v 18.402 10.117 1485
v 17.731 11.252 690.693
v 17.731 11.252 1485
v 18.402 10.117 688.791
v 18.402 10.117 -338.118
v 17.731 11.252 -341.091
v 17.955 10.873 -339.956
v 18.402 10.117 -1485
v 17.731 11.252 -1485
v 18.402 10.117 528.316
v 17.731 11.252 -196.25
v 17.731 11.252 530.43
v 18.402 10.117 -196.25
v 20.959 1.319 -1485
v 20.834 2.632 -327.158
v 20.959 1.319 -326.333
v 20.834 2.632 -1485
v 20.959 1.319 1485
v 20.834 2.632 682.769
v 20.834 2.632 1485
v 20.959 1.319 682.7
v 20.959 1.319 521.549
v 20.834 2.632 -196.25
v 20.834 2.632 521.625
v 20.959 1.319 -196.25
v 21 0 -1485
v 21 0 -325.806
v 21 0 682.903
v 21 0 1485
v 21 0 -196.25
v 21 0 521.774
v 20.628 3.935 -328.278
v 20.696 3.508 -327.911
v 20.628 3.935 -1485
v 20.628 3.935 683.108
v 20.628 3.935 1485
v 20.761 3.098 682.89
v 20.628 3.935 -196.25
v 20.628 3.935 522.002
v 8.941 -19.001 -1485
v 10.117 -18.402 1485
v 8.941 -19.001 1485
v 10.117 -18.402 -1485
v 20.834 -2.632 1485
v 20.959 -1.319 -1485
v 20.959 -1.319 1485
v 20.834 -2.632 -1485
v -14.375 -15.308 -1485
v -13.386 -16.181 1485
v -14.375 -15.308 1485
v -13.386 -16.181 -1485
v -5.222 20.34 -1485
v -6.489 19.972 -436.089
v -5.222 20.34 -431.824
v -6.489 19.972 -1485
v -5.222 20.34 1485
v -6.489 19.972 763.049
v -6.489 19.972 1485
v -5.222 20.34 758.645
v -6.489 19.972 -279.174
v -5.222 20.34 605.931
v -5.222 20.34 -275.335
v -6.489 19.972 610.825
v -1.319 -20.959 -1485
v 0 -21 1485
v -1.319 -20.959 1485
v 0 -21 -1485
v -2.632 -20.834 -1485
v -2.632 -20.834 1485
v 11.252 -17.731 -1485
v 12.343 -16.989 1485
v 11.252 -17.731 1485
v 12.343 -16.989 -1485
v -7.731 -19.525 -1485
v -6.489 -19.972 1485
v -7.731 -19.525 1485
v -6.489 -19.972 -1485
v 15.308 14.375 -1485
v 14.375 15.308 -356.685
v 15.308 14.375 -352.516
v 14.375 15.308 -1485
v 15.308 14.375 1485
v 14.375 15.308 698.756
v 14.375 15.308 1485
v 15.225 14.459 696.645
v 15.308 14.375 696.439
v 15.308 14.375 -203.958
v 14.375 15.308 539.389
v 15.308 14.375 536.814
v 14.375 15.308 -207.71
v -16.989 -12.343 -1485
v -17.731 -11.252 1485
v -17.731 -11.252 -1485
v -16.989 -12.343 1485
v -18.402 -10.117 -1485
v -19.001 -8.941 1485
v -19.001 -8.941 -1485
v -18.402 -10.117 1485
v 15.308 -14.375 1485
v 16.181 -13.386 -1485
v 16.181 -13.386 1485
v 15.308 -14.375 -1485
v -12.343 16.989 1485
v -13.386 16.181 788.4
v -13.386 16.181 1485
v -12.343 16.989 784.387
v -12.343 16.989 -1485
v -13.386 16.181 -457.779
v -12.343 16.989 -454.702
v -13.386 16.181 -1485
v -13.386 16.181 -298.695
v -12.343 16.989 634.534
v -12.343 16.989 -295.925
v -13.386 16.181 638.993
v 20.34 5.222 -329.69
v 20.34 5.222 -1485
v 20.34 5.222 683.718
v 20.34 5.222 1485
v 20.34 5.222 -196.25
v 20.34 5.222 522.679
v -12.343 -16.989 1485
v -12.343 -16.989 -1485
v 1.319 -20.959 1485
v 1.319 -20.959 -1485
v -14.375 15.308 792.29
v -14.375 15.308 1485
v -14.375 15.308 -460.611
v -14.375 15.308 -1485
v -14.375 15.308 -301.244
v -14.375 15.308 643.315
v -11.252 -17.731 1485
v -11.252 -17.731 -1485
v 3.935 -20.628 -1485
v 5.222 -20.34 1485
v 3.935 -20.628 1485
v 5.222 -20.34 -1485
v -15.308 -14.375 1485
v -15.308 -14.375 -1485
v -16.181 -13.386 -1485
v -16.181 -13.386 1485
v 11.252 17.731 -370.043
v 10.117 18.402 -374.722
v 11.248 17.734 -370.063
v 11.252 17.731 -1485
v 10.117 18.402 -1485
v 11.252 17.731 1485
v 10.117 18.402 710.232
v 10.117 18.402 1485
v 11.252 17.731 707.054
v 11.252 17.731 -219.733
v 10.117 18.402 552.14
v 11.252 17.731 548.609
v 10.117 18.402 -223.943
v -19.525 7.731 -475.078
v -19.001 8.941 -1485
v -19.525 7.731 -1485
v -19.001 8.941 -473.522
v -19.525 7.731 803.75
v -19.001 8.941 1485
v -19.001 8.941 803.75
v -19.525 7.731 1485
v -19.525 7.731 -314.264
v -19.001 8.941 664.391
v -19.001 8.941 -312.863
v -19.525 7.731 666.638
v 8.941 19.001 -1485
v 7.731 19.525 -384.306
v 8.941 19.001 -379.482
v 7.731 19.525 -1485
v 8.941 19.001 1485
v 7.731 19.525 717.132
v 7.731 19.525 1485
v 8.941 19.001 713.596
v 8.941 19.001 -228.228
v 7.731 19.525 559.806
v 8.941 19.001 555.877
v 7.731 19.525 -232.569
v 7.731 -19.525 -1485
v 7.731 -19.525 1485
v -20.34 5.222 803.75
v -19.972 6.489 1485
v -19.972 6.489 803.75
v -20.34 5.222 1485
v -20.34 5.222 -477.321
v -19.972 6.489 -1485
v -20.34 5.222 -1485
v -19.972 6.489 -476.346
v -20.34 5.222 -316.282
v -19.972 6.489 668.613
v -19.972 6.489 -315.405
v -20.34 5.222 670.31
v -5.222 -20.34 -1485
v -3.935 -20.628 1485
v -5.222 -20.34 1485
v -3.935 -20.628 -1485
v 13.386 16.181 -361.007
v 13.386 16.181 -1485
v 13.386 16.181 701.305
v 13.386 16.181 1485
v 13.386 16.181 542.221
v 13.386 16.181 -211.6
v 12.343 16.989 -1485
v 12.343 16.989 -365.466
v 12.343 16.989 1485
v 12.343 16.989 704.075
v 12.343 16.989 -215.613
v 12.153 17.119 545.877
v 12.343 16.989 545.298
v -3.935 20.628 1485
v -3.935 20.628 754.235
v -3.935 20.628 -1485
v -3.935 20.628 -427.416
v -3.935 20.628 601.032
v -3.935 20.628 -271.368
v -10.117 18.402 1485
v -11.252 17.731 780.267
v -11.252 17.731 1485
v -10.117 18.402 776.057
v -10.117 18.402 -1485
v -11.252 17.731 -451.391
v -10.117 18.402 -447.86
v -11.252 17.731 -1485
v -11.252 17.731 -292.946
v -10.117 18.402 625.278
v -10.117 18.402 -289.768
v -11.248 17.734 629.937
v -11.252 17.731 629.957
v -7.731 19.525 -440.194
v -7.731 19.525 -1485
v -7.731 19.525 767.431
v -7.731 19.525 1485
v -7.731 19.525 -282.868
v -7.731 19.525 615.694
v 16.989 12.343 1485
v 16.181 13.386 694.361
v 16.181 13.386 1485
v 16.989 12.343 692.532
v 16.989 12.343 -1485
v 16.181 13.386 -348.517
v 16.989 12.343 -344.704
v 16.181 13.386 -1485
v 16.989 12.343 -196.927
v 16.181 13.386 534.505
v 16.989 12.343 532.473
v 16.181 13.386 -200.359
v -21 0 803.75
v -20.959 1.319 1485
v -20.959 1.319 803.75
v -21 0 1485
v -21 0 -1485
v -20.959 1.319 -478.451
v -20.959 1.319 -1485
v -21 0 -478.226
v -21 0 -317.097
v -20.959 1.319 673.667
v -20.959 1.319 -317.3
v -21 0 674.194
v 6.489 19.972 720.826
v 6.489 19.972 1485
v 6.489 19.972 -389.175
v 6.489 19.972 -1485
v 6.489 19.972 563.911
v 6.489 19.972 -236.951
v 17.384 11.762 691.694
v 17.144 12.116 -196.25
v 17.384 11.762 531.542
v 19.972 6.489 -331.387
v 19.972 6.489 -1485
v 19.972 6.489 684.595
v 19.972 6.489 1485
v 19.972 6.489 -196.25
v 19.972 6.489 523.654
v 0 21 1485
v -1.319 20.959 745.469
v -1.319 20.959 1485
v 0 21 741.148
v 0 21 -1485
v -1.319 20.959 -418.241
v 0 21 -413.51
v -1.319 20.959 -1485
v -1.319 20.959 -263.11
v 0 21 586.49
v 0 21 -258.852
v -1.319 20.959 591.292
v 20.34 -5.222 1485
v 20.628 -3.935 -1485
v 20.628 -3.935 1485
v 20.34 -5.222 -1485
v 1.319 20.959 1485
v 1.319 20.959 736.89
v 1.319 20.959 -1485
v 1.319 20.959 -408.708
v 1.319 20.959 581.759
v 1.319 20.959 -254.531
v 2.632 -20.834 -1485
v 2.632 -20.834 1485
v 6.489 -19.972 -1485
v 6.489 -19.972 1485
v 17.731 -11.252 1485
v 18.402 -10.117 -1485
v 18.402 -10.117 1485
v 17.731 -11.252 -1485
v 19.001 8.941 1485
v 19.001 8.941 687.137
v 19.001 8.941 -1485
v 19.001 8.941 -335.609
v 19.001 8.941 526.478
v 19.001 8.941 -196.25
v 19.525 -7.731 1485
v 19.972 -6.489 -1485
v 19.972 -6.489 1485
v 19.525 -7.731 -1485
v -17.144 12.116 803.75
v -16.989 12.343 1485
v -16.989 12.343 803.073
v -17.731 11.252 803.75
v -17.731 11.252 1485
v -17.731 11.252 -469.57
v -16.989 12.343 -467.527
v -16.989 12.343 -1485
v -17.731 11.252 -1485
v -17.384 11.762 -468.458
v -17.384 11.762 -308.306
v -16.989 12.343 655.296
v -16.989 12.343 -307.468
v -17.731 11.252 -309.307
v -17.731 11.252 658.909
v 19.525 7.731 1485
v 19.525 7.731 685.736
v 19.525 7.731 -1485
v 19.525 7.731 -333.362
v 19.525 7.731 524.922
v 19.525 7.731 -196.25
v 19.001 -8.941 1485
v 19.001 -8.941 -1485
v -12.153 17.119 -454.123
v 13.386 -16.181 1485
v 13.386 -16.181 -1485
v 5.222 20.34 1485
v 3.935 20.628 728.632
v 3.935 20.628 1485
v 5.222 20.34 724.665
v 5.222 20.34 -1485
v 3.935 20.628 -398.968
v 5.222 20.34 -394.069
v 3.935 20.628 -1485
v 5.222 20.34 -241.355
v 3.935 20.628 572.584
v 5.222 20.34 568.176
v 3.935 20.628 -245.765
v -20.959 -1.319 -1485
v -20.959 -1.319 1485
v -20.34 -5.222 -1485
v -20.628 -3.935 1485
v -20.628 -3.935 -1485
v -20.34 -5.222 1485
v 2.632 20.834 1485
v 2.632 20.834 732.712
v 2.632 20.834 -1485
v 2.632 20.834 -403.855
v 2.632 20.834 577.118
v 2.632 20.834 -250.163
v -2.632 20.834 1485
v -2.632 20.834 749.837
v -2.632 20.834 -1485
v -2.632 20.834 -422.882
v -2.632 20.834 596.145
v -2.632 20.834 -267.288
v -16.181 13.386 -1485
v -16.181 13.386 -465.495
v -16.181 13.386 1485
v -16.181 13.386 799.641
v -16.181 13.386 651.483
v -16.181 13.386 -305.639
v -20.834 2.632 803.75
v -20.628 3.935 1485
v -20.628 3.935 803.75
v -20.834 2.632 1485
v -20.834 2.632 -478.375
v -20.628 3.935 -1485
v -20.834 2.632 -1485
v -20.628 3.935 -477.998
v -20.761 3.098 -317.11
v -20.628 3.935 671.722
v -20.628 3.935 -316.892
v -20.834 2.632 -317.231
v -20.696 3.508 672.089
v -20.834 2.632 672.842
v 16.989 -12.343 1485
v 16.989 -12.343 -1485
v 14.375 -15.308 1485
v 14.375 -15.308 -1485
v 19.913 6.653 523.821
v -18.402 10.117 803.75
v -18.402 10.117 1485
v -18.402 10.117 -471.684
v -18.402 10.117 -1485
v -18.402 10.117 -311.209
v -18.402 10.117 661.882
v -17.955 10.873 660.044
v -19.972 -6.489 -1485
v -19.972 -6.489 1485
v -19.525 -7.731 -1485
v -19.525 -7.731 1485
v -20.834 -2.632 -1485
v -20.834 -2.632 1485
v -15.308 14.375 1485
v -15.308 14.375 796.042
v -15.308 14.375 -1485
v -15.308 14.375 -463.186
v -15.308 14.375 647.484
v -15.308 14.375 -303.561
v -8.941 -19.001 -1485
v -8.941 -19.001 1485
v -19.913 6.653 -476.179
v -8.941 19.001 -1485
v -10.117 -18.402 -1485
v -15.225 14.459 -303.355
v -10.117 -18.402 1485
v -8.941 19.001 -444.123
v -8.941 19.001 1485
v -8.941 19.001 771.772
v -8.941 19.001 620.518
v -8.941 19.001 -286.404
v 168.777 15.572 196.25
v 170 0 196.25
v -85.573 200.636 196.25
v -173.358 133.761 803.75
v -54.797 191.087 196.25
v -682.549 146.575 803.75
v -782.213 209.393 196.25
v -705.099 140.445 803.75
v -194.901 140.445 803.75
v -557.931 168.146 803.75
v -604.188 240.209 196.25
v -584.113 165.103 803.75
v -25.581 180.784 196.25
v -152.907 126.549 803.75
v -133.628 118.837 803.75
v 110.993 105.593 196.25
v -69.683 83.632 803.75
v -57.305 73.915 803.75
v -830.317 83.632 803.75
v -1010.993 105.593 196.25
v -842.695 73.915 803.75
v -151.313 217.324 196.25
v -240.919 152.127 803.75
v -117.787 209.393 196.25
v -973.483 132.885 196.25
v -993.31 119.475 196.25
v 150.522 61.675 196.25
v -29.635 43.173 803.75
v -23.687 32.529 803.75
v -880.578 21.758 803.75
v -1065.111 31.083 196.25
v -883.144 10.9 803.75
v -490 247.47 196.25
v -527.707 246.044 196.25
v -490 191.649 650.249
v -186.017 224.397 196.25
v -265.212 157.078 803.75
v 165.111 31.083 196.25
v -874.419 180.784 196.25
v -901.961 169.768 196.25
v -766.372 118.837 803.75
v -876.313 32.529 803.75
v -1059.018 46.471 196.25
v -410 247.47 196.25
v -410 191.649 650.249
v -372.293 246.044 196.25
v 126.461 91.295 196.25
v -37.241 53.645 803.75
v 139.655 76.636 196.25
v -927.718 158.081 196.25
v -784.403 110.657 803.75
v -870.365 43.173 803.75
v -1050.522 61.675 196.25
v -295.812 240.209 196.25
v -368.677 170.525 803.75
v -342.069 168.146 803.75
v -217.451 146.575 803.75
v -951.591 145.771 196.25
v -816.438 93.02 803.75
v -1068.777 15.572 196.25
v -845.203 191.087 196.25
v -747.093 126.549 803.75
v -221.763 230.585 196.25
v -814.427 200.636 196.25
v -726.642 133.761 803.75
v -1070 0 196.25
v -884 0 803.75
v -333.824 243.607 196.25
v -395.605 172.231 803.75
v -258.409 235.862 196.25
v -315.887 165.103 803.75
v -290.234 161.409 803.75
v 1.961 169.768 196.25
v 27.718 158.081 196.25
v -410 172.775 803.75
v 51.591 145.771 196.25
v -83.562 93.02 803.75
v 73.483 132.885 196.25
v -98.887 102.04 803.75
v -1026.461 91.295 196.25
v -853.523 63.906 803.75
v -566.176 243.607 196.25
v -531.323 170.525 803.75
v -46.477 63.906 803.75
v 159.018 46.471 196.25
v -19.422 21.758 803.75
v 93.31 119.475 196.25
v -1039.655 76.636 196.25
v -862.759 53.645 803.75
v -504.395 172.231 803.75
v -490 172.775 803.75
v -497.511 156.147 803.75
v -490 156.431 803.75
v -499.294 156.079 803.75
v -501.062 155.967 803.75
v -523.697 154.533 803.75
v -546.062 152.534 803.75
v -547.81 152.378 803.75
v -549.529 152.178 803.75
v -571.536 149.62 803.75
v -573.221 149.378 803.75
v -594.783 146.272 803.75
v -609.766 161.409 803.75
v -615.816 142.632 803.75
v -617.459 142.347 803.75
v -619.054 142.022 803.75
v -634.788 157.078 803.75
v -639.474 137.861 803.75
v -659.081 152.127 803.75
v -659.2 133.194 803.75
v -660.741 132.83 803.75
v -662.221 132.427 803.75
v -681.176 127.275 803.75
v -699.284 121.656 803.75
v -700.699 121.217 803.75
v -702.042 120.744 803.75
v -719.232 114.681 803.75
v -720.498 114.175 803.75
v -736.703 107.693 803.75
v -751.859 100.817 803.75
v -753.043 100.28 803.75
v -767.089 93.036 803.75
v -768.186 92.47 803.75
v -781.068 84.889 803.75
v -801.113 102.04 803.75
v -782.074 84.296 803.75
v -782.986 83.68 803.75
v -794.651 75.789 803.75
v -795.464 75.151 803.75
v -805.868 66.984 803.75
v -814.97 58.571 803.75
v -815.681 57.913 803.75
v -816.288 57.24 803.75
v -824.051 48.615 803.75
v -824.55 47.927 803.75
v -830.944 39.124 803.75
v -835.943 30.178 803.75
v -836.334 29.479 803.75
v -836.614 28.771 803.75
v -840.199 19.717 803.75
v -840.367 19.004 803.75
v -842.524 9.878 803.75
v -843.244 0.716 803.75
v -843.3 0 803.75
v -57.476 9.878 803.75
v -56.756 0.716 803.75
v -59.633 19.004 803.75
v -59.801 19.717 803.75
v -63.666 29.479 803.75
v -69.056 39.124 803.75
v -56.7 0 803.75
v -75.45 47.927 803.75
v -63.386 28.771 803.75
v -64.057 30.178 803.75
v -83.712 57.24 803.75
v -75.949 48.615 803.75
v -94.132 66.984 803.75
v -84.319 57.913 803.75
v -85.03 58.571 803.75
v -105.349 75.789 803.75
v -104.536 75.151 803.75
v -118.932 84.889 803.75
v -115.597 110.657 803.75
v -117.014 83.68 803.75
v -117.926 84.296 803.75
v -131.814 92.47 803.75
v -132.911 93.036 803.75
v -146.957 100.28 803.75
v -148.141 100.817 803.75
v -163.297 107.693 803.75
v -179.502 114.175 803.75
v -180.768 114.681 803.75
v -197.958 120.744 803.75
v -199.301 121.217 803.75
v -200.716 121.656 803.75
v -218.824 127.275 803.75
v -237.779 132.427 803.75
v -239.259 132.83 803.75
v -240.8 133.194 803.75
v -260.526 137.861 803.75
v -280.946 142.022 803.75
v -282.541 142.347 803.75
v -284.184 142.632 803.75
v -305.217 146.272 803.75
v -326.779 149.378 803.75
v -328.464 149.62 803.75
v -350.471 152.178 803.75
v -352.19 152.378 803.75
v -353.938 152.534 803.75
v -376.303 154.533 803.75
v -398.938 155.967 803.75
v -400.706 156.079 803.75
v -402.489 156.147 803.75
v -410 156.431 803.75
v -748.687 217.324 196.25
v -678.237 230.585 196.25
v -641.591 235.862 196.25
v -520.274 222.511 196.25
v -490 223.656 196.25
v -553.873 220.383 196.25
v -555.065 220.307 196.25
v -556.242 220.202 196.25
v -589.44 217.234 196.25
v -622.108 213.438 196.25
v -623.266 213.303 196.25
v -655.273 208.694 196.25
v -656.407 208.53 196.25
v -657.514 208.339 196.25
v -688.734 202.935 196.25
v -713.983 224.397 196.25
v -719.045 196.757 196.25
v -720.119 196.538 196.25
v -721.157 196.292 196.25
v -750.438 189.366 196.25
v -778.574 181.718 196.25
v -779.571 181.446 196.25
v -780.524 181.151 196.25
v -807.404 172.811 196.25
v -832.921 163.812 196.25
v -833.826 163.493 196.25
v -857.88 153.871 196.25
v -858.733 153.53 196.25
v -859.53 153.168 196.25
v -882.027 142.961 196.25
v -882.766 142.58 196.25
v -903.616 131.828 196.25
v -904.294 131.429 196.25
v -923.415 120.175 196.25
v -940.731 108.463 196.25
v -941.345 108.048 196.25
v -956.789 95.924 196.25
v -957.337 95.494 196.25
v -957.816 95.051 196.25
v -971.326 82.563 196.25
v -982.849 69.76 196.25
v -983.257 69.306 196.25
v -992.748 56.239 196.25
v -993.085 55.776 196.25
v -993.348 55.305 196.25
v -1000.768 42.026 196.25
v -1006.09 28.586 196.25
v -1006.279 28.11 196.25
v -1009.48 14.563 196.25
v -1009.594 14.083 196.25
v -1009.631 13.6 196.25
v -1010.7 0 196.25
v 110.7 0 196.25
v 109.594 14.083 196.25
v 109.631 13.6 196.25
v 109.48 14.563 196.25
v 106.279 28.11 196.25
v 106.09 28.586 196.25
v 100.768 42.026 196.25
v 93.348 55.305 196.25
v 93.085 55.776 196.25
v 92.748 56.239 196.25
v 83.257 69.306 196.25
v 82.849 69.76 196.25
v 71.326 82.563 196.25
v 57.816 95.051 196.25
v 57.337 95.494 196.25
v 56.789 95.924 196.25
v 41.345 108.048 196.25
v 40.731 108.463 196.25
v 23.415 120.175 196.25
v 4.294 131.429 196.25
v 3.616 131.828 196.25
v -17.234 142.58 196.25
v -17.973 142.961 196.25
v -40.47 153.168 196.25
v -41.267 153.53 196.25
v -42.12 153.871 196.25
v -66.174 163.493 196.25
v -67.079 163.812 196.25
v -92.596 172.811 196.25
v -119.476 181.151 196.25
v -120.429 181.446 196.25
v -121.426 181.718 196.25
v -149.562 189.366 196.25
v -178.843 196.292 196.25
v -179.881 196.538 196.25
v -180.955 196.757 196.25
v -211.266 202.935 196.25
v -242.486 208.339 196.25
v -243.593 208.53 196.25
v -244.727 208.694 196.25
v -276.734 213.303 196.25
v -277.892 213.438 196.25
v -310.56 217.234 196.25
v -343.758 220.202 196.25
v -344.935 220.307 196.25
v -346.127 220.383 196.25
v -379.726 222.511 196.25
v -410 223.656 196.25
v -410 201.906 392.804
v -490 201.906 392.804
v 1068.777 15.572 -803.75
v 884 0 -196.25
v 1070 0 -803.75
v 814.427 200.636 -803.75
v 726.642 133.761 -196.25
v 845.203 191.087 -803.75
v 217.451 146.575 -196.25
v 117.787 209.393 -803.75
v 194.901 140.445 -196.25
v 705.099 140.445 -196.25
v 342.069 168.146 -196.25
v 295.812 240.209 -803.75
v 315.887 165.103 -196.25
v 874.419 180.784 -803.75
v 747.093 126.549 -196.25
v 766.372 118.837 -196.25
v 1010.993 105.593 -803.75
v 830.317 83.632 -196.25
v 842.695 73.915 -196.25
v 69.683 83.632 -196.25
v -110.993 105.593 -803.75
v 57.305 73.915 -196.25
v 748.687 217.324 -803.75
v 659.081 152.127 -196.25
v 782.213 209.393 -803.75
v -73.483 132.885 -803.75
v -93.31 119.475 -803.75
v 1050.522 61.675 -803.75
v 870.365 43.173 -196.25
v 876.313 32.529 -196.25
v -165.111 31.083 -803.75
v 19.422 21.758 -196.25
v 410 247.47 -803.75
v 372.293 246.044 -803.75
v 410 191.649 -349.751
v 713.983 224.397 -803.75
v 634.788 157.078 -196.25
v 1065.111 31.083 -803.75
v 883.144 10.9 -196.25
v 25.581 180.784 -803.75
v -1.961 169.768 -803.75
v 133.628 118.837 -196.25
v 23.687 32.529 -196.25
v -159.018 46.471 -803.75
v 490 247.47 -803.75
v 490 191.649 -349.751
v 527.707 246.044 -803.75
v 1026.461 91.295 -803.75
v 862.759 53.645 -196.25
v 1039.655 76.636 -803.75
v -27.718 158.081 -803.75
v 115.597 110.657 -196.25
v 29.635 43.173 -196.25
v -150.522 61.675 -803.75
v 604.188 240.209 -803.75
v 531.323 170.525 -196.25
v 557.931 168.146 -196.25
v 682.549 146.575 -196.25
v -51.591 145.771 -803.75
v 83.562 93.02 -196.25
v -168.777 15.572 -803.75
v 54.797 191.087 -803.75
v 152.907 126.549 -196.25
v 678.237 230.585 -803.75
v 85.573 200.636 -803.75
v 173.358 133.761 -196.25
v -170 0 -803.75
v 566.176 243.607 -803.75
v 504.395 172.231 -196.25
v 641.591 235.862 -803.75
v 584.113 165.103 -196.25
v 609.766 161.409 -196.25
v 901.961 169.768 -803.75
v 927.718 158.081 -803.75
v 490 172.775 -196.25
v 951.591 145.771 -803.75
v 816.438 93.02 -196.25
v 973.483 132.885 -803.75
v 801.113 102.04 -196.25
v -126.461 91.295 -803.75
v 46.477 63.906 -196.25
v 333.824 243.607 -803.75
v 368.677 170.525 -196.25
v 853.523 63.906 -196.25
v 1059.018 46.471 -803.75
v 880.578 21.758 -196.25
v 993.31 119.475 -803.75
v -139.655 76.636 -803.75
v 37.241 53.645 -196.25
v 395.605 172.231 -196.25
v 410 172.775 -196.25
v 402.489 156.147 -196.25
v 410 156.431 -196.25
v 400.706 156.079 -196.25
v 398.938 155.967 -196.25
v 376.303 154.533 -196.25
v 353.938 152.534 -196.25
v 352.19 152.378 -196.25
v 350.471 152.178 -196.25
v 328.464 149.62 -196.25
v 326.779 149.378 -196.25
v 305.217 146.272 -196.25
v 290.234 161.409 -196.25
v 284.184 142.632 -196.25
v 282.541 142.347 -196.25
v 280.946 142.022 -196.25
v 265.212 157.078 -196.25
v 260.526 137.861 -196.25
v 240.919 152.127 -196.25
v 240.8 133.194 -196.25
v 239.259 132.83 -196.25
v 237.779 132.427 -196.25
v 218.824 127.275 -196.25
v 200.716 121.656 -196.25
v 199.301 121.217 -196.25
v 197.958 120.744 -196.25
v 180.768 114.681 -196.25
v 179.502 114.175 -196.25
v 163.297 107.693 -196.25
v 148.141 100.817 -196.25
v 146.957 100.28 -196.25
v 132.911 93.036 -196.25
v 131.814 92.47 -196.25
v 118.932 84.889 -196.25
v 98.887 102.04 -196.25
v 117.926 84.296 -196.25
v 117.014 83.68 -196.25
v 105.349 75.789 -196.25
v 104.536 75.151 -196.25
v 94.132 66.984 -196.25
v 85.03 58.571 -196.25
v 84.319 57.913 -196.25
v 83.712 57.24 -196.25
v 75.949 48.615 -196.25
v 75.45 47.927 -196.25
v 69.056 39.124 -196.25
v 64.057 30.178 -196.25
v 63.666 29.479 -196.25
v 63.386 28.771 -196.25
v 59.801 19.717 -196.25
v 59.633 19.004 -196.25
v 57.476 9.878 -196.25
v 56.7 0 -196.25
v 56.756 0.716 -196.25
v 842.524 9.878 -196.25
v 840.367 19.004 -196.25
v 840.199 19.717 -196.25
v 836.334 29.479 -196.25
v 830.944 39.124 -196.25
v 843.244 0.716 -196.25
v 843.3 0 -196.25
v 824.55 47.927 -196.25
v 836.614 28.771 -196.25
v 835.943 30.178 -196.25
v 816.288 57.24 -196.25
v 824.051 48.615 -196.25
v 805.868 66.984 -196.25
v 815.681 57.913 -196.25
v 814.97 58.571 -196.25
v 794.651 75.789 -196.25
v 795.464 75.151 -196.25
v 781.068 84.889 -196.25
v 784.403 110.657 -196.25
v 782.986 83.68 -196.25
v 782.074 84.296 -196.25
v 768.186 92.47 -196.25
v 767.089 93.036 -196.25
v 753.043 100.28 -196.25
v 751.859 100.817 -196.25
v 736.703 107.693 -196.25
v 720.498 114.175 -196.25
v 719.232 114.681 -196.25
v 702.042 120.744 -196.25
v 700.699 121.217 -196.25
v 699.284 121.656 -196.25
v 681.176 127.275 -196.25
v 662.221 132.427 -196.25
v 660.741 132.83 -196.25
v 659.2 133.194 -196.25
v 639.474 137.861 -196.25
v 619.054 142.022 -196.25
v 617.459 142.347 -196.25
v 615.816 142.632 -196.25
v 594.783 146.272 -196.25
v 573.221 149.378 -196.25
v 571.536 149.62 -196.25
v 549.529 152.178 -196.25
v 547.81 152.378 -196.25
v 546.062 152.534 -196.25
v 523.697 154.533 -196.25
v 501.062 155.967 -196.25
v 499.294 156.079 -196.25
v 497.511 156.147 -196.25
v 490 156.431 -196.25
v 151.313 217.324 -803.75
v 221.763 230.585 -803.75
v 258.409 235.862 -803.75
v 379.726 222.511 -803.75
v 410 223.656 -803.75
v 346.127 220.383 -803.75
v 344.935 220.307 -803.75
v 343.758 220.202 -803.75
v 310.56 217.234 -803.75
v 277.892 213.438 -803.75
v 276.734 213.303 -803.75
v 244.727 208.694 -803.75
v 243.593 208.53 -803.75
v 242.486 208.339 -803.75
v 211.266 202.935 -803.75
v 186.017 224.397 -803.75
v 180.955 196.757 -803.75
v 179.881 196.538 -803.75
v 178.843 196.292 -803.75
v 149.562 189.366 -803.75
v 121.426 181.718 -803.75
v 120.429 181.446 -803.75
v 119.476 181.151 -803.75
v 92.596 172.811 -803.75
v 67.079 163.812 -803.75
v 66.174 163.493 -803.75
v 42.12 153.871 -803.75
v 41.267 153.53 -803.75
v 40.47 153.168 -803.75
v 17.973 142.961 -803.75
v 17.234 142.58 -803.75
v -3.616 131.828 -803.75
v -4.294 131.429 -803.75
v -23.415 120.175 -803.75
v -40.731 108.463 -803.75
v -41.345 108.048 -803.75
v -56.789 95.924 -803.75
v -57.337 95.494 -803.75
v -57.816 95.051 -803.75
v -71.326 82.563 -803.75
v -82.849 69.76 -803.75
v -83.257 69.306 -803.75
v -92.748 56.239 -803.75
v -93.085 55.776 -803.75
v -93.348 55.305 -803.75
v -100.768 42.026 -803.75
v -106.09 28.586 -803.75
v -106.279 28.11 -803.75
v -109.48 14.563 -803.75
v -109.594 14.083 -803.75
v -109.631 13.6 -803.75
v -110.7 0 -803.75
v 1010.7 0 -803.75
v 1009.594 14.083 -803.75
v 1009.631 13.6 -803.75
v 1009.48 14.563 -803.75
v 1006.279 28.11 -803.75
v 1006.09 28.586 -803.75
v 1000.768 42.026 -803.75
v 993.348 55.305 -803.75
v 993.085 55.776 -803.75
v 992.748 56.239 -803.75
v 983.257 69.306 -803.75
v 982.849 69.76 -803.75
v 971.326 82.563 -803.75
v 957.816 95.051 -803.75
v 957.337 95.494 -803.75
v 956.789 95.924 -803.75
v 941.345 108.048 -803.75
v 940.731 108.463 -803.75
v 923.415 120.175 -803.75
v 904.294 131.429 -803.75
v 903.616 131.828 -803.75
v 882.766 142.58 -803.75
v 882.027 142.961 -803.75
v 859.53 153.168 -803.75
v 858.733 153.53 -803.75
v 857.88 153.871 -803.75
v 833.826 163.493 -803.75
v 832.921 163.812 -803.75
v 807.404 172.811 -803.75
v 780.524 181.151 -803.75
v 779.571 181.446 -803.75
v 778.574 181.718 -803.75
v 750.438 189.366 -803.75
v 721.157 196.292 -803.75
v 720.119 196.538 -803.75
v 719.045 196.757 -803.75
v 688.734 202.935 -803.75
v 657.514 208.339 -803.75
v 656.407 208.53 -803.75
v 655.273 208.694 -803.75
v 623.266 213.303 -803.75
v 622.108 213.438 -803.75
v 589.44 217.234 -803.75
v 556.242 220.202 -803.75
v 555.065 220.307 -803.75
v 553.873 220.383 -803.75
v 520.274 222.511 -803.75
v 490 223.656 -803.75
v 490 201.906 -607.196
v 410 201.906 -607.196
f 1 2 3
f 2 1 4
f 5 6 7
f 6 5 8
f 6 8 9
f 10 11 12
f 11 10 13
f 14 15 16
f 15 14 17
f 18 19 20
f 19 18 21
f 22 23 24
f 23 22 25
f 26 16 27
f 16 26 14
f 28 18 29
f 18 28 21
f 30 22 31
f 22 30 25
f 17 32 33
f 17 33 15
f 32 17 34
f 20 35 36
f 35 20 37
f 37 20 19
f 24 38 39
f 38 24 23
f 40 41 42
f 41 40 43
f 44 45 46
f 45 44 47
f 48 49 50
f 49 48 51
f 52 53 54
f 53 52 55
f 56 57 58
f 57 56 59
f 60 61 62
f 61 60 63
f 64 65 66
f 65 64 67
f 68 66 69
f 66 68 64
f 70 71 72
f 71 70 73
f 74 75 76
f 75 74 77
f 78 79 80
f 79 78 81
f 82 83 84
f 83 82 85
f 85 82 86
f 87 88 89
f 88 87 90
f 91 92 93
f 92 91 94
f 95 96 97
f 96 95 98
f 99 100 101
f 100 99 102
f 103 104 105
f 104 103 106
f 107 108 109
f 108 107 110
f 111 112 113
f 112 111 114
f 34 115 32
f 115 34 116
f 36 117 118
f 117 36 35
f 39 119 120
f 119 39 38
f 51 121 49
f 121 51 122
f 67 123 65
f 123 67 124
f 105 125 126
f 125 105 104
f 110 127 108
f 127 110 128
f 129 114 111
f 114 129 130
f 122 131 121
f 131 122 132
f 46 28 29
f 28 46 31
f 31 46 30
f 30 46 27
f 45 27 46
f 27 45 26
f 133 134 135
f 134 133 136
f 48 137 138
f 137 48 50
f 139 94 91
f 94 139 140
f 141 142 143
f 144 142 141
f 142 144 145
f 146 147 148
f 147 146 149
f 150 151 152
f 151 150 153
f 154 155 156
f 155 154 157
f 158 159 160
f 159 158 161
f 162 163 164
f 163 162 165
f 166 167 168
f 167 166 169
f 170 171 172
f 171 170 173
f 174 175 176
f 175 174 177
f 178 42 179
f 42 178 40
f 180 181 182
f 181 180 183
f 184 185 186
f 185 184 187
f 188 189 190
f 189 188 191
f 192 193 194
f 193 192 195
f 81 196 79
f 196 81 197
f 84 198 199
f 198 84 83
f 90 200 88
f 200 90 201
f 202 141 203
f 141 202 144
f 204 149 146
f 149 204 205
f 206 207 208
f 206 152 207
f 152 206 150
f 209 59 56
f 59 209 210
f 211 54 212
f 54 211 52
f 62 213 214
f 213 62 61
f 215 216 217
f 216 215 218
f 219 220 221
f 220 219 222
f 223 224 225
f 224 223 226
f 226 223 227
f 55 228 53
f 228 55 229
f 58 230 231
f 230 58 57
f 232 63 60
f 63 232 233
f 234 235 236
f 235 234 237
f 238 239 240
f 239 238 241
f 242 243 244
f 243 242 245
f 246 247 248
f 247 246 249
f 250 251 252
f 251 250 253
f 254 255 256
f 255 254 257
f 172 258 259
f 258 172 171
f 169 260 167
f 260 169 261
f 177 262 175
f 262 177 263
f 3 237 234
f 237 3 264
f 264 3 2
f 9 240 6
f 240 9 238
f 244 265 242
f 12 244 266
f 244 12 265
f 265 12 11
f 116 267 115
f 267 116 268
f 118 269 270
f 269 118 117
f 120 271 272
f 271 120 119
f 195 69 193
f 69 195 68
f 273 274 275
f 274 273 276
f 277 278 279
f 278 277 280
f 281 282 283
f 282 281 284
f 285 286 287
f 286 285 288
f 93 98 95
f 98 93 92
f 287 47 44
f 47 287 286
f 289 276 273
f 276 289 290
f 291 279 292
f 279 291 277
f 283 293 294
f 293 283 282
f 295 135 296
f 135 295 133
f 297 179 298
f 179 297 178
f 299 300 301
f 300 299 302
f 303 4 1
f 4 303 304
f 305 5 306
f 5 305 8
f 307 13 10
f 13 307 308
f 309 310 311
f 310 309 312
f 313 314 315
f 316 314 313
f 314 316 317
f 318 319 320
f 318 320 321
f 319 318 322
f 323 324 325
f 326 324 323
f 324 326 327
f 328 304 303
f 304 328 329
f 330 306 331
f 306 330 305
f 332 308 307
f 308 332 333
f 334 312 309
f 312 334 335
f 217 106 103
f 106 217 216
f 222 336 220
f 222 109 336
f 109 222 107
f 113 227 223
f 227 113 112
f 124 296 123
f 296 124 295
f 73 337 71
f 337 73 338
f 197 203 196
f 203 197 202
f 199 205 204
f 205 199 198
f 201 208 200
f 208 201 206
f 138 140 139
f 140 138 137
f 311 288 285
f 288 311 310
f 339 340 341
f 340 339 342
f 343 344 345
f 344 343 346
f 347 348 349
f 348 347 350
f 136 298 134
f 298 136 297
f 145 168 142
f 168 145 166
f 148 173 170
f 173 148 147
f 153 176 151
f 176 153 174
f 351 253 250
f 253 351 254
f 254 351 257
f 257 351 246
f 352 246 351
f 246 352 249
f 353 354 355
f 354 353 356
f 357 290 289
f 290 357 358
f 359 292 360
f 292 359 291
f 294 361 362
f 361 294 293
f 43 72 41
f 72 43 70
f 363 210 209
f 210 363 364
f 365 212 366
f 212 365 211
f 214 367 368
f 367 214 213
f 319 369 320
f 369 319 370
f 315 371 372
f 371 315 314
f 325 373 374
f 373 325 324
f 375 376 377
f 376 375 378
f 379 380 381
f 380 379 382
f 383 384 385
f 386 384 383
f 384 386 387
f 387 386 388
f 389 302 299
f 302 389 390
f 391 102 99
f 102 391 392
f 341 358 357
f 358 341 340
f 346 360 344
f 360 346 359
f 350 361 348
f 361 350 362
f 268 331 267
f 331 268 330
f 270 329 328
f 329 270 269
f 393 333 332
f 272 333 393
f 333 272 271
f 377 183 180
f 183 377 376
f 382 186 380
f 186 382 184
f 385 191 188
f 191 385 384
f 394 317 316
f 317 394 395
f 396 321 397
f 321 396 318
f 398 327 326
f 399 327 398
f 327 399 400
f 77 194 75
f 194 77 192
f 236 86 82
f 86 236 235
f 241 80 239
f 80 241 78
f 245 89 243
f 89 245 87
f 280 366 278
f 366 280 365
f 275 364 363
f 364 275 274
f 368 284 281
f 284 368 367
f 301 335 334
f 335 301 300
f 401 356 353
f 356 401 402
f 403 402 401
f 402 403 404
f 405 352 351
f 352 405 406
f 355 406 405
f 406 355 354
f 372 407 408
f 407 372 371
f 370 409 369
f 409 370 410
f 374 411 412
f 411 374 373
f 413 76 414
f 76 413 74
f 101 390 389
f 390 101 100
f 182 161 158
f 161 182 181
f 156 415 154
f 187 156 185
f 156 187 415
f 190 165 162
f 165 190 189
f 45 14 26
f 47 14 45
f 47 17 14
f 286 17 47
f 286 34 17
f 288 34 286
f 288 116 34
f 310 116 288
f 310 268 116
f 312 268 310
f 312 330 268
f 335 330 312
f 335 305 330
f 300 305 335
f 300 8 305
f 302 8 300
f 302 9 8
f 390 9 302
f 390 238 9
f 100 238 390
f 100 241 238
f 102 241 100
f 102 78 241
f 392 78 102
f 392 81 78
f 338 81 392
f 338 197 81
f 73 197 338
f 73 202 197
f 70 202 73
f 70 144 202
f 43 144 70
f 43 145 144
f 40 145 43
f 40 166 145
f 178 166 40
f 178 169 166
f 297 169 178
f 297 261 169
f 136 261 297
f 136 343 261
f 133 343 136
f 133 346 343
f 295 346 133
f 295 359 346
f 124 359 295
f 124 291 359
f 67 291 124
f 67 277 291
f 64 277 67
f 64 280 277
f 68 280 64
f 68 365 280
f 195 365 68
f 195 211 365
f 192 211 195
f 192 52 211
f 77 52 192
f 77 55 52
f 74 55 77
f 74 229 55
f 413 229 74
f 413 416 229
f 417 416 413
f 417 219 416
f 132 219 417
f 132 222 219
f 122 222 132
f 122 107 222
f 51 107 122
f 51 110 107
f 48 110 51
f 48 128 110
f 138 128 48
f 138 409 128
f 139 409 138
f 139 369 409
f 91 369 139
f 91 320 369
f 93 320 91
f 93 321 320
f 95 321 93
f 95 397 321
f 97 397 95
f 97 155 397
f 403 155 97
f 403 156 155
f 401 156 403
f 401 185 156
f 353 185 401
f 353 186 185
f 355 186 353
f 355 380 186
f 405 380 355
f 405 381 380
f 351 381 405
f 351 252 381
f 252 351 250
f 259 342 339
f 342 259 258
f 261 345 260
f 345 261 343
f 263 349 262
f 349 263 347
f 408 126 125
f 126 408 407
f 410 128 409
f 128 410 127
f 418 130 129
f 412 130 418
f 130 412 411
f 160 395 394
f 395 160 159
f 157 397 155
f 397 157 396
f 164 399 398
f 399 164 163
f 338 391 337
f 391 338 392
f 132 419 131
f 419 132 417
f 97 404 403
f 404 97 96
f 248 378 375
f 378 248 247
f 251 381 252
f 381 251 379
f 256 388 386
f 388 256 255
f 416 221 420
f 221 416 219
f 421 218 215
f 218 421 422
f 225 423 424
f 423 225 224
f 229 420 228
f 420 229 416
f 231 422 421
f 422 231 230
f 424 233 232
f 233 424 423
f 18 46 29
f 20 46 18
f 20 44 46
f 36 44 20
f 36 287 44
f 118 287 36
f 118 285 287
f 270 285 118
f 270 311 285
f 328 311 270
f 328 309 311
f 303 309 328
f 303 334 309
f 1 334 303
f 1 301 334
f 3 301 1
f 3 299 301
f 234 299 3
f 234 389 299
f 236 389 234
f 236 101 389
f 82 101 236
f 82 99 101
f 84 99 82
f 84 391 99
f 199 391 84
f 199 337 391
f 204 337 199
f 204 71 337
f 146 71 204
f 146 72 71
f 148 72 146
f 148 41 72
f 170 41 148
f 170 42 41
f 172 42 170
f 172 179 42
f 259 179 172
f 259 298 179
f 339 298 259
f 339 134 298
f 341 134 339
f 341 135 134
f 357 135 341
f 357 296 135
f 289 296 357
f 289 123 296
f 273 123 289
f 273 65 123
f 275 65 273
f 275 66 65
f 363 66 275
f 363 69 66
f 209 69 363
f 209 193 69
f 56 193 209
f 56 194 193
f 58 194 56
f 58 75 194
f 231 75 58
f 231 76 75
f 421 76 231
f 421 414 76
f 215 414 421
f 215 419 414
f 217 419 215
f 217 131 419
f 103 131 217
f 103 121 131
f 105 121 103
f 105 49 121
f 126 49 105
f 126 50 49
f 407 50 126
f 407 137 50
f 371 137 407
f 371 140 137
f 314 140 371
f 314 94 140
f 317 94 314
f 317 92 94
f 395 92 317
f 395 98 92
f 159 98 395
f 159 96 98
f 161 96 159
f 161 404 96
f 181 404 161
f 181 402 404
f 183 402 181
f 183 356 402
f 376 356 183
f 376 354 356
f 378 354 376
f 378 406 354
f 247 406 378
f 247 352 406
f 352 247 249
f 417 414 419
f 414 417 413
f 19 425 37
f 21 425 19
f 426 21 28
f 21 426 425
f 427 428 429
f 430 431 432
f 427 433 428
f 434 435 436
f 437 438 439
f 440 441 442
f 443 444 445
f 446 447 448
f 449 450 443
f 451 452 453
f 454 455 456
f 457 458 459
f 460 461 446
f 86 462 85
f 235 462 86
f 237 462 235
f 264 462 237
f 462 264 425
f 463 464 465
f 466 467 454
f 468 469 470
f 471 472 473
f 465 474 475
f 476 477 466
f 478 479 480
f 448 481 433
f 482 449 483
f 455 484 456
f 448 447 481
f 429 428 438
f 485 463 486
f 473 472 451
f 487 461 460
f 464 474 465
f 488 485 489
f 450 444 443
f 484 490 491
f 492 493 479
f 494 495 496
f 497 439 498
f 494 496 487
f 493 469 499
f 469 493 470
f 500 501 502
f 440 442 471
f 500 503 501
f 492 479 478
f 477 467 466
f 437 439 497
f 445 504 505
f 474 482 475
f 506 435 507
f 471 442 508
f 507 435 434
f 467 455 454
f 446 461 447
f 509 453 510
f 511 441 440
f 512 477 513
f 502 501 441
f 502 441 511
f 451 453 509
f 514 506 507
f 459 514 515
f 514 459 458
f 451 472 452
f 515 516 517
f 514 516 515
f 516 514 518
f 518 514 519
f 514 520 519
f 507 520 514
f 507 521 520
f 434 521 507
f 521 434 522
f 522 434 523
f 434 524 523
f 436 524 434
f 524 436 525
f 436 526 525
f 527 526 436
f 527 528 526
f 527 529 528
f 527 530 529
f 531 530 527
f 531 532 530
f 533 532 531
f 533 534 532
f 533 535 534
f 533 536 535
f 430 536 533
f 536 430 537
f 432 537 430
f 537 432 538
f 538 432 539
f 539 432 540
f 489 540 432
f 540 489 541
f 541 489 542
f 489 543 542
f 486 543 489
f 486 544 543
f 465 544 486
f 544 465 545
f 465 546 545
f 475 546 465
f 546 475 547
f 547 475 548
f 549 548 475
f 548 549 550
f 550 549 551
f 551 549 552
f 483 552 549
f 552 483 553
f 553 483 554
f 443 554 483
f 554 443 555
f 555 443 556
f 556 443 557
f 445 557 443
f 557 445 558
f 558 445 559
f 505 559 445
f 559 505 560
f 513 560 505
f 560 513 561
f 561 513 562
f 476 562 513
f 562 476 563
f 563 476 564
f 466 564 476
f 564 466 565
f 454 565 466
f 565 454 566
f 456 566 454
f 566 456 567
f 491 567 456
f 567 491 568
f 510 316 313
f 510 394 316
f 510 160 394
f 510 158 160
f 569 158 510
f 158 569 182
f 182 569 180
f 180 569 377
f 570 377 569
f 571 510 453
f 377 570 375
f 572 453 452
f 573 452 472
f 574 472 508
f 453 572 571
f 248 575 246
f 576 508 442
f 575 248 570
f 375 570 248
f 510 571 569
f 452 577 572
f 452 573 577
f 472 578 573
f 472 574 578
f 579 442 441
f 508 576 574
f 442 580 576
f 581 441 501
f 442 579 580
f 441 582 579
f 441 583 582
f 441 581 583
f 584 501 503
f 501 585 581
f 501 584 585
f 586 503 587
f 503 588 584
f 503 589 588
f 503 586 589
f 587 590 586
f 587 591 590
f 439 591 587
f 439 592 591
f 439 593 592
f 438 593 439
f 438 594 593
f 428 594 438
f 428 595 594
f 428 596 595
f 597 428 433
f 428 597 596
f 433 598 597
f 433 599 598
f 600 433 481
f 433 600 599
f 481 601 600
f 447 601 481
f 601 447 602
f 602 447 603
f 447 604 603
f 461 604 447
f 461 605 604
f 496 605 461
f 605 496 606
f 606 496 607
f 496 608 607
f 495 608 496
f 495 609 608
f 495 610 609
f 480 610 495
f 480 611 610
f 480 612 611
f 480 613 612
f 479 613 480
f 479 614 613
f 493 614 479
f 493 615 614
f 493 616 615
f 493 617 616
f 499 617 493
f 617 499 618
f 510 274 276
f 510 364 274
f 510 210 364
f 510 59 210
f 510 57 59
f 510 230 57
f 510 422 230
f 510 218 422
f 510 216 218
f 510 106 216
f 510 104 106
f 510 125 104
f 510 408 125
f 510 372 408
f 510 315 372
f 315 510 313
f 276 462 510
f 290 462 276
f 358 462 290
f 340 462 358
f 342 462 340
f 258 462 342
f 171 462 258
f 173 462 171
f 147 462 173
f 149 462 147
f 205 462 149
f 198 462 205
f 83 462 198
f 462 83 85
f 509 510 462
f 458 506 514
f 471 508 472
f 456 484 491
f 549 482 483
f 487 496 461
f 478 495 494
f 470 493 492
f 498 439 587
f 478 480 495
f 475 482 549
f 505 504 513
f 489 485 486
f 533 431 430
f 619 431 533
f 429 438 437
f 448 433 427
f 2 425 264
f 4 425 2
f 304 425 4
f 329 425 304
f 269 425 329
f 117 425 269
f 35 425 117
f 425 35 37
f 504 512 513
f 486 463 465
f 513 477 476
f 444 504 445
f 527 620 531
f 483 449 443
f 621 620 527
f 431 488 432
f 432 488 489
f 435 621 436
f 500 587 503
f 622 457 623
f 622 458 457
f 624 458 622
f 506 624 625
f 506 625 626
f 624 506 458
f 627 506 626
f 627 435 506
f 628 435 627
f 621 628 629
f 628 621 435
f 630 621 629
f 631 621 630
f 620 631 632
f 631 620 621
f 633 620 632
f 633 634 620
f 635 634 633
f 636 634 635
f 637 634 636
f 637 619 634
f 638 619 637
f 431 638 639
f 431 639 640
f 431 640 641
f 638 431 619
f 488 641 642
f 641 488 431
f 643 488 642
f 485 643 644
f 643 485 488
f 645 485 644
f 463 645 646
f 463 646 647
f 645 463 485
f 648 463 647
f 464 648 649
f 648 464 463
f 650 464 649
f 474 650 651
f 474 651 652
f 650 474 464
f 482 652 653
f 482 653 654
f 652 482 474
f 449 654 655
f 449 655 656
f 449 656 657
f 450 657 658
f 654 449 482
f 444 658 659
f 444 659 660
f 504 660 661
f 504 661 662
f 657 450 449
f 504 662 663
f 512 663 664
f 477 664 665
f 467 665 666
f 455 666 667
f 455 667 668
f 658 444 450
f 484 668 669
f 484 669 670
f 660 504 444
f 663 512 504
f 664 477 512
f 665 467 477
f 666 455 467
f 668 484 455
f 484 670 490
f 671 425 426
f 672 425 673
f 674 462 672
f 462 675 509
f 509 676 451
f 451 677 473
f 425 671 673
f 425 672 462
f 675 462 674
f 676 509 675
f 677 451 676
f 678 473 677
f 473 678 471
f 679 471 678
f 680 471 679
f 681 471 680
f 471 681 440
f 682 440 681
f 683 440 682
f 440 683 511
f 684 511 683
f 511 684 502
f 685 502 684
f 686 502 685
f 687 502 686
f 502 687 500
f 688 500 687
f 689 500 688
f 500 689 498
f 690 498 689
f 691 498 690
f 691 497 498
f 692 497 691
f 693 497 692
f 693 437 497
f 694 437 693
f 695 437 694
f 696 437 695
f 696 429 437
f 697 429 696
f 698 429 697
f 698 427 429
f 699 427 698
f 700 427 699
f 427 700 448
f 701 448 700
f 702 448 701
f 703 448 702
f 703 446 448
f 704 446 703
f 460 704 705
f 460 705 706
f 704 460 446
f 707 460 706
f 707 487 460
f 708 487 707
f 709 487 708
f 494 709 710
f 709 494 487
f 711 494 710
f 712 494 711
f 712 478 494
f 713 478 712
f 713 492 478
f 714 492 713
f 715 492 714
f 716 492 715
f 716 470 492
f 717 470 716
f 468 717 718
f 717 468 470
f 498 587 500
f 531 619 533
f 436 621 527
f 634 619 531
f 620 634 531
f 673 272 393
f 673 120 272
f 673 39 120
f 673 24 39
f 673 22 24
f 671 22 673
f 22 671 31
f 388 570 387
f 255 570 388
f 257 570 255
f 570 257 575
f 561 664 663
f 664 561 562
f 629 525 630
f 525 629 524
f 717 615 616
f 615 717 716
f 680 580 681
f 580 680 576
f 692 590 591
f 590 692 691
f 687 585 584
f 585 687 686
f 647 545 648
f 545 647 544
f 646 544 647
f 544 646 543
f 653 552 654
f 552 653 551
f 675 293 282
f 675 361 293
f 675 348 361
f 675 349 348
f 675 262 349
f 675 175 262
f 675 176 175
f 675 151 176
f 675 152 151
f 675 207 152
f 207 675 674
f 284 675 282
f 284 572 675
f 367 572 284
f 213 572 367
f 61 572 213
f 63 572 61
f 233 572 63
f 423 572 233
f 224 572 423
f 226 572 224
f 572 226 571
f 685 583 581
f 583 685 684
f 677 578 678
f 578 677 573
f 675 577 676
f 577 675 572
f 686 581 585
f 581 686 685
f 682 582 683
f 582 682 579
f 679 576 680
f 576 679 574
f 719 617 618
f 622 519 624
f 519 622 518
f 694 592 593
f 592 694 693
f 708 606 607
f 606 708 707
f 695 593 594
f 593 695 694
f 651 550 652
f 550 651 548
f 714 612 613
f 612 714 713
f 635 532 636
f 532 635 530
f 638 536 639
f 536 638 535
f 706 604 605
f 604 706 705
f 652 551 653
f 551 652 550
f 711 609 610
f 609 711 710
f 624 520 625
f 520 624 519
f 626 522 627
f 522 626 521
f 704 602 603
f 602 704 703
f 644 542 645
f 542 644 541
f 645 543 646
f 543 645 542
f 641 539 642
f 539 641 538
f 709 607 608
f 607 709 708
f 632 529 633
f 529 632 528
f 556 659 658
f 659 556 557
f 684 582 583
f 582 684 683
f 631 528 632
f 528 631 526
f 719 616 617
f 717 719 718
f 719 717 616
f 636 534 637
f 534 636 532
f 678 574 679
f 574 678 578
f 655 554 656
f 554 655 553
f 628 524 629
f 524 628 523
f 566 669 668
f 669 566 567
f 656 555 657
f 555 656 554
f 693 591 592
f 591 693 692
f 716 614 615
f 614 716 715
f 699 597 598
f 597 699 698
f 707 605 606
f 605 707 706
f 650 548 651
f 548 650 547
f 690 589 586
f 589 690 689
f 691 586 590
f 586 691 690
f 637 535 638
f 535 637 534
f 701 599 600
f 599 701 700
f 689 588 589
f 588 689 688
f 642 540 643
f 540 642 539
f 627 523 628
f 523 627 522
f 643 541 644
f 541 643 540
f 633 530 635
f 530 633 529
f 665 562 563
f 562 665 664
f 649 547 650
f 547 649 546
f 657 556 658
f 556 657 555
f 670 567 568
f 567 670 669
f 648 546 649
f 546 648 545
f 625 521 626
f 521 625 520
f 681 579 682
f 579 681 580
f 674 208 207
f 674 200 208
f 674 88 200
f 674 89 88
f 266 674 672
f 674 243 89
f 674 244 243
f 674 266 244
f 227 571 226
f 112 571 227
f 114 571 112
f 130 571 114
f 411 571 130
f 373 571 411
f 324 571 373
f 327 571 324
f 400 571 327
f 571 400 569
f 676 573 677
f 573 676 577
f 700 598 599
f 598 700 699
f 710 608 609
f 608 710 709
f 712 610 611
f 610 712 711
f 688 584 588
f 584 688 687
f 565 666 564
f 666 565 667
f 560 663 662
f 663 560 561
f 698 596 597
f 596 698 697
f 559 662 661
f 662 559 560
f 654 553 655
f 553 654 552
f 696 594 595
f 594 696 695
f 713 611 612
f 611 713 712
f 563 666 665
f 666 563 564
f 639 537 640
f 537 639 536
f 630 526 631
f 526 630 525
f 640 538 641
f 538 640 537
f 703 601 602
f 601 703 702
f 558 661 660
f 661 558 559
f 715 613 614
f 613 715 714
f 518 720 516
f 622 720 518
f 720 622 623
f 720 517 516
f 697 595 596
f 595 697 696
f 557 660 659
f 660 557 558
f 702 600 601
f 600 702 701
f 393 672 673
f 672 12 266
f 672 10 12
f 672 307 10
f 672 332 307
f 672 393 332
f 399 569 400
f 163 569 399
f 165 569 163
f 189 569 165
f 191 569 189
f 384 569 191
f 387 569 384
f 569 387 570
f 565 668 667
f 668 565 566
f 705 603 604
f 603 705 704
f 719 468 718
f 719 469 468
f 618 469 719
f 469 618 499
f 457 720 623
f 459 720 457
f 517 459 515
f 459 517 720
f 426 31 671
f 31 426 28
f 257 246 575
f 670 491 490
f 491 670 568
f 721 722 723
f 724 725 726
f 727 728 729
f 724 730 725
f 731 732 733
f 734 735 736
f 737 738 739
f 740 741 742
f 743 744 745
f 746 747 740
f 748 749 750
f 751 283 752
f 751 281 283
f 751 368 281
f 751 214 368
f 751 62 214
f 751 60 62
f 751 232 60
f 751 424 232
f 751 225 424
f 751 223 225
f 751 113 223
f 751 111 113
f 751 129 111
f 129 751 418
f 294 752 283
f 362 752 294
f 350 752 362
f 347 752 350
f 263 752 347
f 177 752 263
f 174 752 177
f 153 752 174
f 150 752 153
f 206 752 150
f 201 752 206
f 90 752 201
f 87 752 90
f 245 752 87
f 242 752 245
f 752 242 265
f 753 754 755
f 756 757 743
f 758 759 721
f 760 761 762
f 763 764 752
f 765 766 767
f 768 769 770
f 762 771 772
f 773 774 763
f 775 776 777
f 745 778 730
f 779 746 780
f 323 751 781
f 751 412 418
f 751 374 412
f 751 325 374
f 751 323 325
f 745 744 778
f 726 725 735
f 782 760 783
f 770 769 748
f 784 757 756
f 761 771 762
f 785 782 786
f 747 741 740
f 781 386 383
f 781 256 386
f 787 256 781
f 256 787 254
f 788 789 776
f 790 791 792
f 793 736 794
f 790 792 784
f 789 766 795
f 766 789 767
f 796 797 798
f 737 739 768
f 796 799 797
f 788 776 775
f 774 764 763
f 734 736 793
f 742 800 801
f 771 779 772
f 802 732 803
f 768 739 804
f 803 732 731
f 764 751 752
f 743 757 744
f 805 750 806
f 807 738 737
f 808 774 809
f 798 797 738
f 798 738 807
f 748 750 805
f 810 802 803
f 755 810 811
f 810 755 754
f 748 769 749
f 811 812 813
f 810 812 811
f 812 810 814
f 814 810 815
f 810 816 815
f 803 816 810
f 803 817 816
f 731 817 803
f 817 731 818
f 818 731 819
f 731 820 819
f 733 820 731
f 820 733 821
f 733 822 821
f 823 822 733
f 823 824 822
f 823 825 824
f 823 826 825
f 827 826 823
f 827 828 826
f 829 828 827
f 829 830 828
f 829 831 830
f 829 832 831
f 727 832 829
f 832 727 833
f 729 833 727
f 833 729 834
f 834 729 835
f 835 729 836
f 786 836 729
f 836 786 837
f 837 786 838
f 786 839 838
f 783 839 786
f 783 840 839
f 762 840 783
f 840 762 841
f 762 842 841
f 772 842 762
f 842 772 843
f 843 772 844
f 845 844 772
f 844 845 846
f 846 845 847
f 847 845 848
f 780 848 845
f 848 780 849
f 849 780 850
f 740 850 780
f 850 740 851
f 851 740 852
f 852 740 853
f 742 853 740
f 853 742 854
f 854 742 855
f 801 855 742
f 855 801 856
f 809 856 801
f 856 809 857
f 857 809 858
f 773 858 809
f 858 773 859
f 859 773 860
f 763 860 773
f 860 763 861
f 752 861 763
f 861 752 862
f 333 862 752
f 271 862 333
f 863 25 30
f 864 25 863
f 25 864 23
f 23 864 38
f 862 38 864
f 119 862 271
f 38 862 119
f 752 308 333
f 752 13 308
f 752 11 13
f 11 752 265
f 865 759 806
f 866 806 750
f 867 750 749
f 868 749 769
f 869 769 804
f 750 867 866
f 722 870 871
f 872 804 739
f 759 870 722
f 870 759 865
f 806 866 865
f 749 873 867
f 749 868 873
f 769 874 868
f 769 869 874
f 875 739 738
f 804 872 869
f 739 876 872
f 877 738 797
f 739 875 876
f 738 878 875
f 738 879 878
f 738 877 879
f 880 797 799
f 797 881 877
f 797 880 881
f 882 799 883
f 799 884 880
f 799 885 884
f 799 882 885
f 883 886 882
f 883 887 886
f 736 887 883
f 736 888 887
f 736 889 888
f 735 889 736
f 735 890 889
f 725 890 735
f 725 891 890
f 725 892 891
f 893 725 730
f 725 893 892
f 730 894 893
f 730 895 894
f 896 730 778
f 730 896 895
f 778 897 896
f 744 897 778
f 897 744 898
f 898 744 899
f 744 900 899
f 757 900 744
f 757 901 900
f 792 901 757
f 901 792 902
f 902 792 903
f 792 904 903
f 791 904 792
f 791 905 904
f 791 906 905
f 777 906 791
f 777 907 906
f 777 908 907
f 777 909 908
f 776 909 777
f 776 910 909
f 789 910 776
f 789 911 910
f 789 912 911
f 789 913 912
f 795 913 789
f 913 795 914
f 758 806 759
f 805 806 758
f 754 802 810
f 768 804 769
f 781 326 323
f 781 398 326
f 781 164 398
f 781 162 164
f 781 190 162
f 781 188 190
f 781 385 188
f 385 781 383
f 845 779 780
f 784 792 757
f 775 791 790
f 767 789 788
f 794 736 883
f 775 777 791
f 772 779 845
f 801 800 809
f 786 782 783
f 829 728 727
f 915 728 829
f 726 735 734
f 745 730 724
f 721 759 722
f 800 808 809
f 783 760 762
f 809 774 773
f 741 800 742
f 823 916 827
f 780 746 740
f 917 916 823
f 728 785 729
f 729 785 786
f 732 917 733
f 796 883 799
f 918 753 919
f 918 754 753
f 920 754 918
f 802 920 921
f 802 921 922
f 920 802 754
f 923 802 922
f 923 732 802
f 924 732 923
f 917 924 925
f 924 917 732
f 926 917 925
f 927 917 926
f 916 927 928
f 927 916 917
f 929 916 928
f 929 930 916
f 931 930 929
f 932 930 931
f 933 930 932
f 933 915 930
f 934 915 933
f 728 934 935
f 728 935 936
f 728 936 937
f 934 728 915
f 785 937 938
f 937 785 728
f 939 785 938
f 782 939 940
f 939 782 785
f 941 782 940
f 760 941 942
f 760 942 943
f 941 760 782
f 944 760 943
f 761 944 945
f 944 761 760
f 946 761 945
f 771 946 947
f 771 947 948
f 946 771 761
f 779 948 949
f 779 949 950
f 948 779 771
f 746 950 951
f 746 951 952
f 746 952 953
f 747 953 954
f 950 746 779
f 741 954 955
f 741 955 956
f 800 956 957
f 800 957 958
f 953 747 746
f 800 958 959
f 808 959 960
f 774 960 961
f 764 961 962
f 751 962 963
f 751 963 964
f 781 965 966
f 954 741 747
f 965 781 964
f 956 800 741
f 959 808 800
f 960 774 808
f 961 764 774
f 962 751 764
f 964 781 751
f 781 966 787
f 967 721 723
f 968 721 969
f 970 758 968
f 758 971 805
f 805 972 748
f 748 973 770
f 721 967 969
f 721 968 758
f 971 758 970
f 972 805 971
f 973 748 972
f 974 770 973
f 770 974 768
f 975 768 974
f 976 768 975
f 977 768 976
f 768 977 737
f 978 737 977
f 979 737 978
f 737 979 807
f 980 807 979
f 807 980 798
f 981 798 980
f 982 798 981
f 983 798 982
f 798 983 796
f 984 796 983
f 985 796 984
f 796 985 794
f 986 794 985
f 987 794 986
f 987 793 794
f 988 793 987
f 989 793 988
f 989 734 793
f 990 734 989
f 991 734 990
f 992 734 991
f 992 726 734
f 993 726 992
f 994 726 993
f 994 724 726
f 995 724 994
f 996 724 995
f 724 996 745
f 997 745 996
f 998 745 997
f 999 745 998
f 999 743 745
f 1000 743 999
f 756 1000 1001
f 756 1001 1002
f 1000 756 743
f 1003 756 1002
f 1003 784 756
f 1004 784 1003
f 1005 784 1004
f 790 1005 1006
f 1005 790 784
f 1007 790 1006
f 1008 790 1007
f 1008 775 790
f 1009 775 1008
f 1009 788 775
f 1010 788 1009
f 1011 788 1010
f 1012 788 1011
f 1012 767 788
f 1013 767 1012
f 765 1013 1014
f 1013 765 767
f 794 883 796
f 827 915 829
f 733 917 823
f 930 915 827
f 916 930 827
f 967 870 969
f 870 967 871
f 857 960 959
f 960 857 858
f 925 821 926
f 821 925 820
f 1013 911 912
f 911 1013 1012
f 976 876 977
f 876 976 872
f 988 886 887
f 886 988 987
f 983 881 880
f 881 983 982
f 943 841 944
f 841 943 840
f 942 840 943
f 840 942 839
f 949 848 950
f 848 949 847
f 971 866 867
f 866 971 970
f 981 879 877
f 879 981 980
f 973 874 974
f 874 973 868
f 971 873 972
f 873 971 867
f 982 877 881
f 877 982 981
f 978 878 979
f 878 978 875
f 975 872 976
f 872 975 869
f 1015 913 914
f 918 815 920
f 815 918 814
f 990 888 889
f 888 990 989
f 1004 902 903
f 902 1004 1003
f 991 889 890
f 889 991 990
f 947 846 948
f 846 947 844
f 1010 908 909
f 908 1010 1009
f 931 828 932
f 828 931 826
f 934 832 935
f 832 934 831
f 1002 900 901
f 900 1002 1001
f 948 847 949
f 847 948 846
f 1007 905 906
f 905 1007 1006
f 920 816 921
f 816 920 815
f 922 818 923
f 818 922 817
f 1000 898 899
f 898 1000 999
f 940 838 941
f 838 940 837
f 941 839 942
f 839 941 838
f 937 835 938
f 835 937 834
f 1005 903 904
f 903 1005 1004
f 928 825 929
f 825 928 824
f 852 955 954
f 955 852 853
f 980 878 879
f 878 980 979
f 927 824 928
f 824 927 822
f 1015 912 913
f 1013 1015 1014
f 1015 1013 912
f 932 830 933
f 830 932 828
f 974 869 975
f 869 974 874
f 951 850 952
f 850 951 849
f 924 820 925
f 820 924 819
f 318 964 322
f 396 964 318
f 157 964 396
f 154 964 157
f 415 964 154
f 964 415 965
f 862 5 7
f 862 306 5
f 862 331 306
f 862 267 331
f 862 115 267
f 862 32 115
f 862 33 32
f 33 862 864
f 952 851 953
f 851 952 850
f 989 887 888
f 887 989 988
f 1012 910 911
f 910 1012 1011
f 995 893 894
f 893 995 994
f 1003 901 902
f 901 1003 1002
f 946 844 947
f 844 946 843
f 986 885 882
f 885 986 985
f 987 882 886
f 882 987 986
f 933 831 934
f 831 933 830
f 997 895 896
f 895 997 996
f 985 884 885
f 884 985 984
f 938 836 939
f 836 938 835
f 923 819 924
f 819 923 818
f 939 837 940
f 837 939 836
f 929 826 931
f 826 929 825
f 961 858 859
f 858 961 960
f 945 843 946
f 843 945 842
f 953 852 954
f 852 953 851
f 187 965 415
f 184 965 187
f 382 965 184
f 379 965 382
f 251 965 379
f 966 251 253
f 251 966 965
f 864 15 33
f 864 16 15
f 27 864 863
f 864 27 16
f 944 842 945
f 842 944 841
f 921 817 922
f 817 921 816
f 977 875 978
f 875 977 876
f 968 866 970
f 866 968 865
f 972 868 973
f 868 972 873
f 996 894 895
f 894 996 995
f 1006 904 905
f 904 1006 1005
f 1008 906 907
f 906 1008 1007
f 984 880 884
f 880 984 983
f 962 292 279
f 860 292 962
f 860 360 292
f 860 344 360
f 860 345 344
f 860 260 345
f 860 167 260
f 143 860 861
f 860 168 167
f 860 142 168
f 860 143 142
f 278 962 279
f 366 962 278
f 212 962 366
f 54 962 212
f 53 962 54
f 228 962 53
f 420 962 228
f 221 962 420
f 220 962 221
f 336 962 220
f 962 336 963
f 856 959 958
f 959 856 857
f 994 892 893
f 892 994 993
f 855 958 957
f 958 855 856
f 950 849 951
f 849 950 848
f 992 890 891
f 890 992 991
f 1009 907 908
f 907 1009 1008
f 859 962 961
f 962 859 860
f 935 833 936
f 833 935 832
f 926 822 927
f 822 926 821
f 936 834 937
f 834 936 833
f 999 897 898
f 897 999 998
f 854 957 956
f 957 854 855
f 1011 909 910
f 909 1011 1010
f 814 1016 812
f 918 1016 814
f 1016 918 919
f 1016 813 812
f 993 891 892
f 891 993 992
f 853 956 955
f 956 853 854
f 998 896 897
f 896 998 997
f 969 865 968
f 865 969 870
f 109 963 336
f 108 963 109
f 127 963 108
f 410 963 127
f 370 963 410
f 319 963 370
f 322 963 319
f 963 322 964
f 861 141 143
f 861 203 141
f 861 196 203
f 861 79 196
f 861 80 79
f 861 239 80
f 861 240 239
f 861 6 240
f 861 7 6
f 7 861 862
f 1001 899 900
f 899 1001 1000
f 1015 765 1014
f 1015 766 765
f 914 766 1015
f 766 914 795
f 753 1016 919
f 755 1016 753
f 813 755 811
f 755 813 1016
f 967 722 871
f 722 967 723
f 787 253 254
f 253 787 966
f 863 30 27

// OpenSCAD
// ============================================================================
// PROJECT: XXXG-00W0 WING GUNDAM ZERO EW - LOWER airframe DEFENSE MATRIX
// COMPONENT VAULT: BANDAI CAST RUNNER A - WAIST SKIRT SHELLS A9 & A10
// MANUFACTURING SPEC: WIRELESS INDUCTIVE HARNESS PROXIMITY TERMINALS
// DESIGN PARITY: 5,200 Nm HIP TORQUE ARRAYS & DLC LOW-FRICTION SLIDERS
// ============================================================================

$fn = 100; // Circular segment rendering resolution count

// Structural Constants Scaled 1:1 for a 16.7-Meter Airframe Scale (mm)
skirt_panel_length = 1350;              // Total longitudinal vertical span (mm)
skirt_outer_width = 620;                // Transverse armor plate envelope width (mm)
armor_skin_thickness = 50;              // Solid TiAl protective plating wall (mm)
harness_conduit_width = 80;             // Cast-in 4oz copper logic trace track (mm)

module Runner_A_Skirt_Forge() {
    // Central Supply Injection Runner Axis (Molten Feed Line from Siphon Forge)
    color([0.22, 0.22, 0.25]) {
        cylinder(h = skirt_panel_length * 2.2, d = 42, center = true);
        // Direct injection gates tracking straight into the part mold cavities
        translate() rotate() cylinder(h = 450, d = 22);
        translate([0, 0, -500]) rotate() cylinder(h = 450, d = 22);
    }
    
    // Instantiate Scaled Skeutomorphic Part Molds Symmetrically
    Cast_Outer_Skirt_Armor();
}

module Cast_Outer_Skirt_Armor() {
    // ---- PART A9: LEFT SIDE WAIST SKIRT ARMOR SHELL ---- [Page 7, Step 6 / Page 18, Step 09-6]
    translate([-450, 0, 500]) color([0.85, 0.85, 0.9]) { // Classic White Armor Spec
        difference() {
            // Main tapered external protective side skirt shield panel
            scale([1.0, 0.4, 1.0])
                cylinder(h = skirt_panel_length * 0.45, r1 = skirt_outer_width, r2 = skirt_outer_width * 0.7, center = true);
            
            // Internal pocket excavation (Leaves the rigid 50mm protective wall)
            scale([1.0, 0.4, 1.0])
                cylinder(h = skirt_panel_length * 0.5, r1 = skirt_outer_width - armor_skin_thickness, r2 = (skirt_outer_width * 0.7) - armor_skin_thickness, center = true);
                
            // Continuous cast-in routing track for the 4oz solid-state wiring rails
            cube([harness_conduit_width, skirt_outer_width * 2, skirt_panel_length], center = true);
            
            // Slicing profile tool to generate an asymmetrical half-shell part component
            translate([0, -skirt_outer_width, 0])
                cube([skirt_outer_width * 2, skirt_outer_width * 2, skirt_panel_length * 2], center = true);
        }
    }
    
    // ---- PART A10: RIGHT SIDE WAIST SKIRT ARMOR SHELL ---- [Page 7, Step 6 / Page 18, Step 09-6]
    translate([450, 0, -500]) rotate() color([0.85, 0.85, 0.9]) {
        difference() {
            scale([1.0, 0.4, 1.0])
                cylinder(h = skirt_panel_length * 0.45, r1 = skirt_outer_width, r2 = skirt_outer_width * 0.7, center = true);
            scale([1.0, 0.4, 1.0])
                cylinder(h = skirt_panel_length * 0.5, r1 = skirt_outer_width - armor_skin_thickness, r2 = (skirt_outer_width * 0.7) - armor_skin_thickness, center = true);
            cube([harness_conduit_width, skirt_outer_width * 2, skirt_panel_length], center = true);
            translate([0, -skirt_outer_width, 0])
                cube([skirt_outer_width * 2, skirt_outer_width * 2, skirt_panel_length * 2], center = true);
        }
    }
}

// Render Master Assembly to Parameter Workspace
Runner_A_Skirt_Forge();
